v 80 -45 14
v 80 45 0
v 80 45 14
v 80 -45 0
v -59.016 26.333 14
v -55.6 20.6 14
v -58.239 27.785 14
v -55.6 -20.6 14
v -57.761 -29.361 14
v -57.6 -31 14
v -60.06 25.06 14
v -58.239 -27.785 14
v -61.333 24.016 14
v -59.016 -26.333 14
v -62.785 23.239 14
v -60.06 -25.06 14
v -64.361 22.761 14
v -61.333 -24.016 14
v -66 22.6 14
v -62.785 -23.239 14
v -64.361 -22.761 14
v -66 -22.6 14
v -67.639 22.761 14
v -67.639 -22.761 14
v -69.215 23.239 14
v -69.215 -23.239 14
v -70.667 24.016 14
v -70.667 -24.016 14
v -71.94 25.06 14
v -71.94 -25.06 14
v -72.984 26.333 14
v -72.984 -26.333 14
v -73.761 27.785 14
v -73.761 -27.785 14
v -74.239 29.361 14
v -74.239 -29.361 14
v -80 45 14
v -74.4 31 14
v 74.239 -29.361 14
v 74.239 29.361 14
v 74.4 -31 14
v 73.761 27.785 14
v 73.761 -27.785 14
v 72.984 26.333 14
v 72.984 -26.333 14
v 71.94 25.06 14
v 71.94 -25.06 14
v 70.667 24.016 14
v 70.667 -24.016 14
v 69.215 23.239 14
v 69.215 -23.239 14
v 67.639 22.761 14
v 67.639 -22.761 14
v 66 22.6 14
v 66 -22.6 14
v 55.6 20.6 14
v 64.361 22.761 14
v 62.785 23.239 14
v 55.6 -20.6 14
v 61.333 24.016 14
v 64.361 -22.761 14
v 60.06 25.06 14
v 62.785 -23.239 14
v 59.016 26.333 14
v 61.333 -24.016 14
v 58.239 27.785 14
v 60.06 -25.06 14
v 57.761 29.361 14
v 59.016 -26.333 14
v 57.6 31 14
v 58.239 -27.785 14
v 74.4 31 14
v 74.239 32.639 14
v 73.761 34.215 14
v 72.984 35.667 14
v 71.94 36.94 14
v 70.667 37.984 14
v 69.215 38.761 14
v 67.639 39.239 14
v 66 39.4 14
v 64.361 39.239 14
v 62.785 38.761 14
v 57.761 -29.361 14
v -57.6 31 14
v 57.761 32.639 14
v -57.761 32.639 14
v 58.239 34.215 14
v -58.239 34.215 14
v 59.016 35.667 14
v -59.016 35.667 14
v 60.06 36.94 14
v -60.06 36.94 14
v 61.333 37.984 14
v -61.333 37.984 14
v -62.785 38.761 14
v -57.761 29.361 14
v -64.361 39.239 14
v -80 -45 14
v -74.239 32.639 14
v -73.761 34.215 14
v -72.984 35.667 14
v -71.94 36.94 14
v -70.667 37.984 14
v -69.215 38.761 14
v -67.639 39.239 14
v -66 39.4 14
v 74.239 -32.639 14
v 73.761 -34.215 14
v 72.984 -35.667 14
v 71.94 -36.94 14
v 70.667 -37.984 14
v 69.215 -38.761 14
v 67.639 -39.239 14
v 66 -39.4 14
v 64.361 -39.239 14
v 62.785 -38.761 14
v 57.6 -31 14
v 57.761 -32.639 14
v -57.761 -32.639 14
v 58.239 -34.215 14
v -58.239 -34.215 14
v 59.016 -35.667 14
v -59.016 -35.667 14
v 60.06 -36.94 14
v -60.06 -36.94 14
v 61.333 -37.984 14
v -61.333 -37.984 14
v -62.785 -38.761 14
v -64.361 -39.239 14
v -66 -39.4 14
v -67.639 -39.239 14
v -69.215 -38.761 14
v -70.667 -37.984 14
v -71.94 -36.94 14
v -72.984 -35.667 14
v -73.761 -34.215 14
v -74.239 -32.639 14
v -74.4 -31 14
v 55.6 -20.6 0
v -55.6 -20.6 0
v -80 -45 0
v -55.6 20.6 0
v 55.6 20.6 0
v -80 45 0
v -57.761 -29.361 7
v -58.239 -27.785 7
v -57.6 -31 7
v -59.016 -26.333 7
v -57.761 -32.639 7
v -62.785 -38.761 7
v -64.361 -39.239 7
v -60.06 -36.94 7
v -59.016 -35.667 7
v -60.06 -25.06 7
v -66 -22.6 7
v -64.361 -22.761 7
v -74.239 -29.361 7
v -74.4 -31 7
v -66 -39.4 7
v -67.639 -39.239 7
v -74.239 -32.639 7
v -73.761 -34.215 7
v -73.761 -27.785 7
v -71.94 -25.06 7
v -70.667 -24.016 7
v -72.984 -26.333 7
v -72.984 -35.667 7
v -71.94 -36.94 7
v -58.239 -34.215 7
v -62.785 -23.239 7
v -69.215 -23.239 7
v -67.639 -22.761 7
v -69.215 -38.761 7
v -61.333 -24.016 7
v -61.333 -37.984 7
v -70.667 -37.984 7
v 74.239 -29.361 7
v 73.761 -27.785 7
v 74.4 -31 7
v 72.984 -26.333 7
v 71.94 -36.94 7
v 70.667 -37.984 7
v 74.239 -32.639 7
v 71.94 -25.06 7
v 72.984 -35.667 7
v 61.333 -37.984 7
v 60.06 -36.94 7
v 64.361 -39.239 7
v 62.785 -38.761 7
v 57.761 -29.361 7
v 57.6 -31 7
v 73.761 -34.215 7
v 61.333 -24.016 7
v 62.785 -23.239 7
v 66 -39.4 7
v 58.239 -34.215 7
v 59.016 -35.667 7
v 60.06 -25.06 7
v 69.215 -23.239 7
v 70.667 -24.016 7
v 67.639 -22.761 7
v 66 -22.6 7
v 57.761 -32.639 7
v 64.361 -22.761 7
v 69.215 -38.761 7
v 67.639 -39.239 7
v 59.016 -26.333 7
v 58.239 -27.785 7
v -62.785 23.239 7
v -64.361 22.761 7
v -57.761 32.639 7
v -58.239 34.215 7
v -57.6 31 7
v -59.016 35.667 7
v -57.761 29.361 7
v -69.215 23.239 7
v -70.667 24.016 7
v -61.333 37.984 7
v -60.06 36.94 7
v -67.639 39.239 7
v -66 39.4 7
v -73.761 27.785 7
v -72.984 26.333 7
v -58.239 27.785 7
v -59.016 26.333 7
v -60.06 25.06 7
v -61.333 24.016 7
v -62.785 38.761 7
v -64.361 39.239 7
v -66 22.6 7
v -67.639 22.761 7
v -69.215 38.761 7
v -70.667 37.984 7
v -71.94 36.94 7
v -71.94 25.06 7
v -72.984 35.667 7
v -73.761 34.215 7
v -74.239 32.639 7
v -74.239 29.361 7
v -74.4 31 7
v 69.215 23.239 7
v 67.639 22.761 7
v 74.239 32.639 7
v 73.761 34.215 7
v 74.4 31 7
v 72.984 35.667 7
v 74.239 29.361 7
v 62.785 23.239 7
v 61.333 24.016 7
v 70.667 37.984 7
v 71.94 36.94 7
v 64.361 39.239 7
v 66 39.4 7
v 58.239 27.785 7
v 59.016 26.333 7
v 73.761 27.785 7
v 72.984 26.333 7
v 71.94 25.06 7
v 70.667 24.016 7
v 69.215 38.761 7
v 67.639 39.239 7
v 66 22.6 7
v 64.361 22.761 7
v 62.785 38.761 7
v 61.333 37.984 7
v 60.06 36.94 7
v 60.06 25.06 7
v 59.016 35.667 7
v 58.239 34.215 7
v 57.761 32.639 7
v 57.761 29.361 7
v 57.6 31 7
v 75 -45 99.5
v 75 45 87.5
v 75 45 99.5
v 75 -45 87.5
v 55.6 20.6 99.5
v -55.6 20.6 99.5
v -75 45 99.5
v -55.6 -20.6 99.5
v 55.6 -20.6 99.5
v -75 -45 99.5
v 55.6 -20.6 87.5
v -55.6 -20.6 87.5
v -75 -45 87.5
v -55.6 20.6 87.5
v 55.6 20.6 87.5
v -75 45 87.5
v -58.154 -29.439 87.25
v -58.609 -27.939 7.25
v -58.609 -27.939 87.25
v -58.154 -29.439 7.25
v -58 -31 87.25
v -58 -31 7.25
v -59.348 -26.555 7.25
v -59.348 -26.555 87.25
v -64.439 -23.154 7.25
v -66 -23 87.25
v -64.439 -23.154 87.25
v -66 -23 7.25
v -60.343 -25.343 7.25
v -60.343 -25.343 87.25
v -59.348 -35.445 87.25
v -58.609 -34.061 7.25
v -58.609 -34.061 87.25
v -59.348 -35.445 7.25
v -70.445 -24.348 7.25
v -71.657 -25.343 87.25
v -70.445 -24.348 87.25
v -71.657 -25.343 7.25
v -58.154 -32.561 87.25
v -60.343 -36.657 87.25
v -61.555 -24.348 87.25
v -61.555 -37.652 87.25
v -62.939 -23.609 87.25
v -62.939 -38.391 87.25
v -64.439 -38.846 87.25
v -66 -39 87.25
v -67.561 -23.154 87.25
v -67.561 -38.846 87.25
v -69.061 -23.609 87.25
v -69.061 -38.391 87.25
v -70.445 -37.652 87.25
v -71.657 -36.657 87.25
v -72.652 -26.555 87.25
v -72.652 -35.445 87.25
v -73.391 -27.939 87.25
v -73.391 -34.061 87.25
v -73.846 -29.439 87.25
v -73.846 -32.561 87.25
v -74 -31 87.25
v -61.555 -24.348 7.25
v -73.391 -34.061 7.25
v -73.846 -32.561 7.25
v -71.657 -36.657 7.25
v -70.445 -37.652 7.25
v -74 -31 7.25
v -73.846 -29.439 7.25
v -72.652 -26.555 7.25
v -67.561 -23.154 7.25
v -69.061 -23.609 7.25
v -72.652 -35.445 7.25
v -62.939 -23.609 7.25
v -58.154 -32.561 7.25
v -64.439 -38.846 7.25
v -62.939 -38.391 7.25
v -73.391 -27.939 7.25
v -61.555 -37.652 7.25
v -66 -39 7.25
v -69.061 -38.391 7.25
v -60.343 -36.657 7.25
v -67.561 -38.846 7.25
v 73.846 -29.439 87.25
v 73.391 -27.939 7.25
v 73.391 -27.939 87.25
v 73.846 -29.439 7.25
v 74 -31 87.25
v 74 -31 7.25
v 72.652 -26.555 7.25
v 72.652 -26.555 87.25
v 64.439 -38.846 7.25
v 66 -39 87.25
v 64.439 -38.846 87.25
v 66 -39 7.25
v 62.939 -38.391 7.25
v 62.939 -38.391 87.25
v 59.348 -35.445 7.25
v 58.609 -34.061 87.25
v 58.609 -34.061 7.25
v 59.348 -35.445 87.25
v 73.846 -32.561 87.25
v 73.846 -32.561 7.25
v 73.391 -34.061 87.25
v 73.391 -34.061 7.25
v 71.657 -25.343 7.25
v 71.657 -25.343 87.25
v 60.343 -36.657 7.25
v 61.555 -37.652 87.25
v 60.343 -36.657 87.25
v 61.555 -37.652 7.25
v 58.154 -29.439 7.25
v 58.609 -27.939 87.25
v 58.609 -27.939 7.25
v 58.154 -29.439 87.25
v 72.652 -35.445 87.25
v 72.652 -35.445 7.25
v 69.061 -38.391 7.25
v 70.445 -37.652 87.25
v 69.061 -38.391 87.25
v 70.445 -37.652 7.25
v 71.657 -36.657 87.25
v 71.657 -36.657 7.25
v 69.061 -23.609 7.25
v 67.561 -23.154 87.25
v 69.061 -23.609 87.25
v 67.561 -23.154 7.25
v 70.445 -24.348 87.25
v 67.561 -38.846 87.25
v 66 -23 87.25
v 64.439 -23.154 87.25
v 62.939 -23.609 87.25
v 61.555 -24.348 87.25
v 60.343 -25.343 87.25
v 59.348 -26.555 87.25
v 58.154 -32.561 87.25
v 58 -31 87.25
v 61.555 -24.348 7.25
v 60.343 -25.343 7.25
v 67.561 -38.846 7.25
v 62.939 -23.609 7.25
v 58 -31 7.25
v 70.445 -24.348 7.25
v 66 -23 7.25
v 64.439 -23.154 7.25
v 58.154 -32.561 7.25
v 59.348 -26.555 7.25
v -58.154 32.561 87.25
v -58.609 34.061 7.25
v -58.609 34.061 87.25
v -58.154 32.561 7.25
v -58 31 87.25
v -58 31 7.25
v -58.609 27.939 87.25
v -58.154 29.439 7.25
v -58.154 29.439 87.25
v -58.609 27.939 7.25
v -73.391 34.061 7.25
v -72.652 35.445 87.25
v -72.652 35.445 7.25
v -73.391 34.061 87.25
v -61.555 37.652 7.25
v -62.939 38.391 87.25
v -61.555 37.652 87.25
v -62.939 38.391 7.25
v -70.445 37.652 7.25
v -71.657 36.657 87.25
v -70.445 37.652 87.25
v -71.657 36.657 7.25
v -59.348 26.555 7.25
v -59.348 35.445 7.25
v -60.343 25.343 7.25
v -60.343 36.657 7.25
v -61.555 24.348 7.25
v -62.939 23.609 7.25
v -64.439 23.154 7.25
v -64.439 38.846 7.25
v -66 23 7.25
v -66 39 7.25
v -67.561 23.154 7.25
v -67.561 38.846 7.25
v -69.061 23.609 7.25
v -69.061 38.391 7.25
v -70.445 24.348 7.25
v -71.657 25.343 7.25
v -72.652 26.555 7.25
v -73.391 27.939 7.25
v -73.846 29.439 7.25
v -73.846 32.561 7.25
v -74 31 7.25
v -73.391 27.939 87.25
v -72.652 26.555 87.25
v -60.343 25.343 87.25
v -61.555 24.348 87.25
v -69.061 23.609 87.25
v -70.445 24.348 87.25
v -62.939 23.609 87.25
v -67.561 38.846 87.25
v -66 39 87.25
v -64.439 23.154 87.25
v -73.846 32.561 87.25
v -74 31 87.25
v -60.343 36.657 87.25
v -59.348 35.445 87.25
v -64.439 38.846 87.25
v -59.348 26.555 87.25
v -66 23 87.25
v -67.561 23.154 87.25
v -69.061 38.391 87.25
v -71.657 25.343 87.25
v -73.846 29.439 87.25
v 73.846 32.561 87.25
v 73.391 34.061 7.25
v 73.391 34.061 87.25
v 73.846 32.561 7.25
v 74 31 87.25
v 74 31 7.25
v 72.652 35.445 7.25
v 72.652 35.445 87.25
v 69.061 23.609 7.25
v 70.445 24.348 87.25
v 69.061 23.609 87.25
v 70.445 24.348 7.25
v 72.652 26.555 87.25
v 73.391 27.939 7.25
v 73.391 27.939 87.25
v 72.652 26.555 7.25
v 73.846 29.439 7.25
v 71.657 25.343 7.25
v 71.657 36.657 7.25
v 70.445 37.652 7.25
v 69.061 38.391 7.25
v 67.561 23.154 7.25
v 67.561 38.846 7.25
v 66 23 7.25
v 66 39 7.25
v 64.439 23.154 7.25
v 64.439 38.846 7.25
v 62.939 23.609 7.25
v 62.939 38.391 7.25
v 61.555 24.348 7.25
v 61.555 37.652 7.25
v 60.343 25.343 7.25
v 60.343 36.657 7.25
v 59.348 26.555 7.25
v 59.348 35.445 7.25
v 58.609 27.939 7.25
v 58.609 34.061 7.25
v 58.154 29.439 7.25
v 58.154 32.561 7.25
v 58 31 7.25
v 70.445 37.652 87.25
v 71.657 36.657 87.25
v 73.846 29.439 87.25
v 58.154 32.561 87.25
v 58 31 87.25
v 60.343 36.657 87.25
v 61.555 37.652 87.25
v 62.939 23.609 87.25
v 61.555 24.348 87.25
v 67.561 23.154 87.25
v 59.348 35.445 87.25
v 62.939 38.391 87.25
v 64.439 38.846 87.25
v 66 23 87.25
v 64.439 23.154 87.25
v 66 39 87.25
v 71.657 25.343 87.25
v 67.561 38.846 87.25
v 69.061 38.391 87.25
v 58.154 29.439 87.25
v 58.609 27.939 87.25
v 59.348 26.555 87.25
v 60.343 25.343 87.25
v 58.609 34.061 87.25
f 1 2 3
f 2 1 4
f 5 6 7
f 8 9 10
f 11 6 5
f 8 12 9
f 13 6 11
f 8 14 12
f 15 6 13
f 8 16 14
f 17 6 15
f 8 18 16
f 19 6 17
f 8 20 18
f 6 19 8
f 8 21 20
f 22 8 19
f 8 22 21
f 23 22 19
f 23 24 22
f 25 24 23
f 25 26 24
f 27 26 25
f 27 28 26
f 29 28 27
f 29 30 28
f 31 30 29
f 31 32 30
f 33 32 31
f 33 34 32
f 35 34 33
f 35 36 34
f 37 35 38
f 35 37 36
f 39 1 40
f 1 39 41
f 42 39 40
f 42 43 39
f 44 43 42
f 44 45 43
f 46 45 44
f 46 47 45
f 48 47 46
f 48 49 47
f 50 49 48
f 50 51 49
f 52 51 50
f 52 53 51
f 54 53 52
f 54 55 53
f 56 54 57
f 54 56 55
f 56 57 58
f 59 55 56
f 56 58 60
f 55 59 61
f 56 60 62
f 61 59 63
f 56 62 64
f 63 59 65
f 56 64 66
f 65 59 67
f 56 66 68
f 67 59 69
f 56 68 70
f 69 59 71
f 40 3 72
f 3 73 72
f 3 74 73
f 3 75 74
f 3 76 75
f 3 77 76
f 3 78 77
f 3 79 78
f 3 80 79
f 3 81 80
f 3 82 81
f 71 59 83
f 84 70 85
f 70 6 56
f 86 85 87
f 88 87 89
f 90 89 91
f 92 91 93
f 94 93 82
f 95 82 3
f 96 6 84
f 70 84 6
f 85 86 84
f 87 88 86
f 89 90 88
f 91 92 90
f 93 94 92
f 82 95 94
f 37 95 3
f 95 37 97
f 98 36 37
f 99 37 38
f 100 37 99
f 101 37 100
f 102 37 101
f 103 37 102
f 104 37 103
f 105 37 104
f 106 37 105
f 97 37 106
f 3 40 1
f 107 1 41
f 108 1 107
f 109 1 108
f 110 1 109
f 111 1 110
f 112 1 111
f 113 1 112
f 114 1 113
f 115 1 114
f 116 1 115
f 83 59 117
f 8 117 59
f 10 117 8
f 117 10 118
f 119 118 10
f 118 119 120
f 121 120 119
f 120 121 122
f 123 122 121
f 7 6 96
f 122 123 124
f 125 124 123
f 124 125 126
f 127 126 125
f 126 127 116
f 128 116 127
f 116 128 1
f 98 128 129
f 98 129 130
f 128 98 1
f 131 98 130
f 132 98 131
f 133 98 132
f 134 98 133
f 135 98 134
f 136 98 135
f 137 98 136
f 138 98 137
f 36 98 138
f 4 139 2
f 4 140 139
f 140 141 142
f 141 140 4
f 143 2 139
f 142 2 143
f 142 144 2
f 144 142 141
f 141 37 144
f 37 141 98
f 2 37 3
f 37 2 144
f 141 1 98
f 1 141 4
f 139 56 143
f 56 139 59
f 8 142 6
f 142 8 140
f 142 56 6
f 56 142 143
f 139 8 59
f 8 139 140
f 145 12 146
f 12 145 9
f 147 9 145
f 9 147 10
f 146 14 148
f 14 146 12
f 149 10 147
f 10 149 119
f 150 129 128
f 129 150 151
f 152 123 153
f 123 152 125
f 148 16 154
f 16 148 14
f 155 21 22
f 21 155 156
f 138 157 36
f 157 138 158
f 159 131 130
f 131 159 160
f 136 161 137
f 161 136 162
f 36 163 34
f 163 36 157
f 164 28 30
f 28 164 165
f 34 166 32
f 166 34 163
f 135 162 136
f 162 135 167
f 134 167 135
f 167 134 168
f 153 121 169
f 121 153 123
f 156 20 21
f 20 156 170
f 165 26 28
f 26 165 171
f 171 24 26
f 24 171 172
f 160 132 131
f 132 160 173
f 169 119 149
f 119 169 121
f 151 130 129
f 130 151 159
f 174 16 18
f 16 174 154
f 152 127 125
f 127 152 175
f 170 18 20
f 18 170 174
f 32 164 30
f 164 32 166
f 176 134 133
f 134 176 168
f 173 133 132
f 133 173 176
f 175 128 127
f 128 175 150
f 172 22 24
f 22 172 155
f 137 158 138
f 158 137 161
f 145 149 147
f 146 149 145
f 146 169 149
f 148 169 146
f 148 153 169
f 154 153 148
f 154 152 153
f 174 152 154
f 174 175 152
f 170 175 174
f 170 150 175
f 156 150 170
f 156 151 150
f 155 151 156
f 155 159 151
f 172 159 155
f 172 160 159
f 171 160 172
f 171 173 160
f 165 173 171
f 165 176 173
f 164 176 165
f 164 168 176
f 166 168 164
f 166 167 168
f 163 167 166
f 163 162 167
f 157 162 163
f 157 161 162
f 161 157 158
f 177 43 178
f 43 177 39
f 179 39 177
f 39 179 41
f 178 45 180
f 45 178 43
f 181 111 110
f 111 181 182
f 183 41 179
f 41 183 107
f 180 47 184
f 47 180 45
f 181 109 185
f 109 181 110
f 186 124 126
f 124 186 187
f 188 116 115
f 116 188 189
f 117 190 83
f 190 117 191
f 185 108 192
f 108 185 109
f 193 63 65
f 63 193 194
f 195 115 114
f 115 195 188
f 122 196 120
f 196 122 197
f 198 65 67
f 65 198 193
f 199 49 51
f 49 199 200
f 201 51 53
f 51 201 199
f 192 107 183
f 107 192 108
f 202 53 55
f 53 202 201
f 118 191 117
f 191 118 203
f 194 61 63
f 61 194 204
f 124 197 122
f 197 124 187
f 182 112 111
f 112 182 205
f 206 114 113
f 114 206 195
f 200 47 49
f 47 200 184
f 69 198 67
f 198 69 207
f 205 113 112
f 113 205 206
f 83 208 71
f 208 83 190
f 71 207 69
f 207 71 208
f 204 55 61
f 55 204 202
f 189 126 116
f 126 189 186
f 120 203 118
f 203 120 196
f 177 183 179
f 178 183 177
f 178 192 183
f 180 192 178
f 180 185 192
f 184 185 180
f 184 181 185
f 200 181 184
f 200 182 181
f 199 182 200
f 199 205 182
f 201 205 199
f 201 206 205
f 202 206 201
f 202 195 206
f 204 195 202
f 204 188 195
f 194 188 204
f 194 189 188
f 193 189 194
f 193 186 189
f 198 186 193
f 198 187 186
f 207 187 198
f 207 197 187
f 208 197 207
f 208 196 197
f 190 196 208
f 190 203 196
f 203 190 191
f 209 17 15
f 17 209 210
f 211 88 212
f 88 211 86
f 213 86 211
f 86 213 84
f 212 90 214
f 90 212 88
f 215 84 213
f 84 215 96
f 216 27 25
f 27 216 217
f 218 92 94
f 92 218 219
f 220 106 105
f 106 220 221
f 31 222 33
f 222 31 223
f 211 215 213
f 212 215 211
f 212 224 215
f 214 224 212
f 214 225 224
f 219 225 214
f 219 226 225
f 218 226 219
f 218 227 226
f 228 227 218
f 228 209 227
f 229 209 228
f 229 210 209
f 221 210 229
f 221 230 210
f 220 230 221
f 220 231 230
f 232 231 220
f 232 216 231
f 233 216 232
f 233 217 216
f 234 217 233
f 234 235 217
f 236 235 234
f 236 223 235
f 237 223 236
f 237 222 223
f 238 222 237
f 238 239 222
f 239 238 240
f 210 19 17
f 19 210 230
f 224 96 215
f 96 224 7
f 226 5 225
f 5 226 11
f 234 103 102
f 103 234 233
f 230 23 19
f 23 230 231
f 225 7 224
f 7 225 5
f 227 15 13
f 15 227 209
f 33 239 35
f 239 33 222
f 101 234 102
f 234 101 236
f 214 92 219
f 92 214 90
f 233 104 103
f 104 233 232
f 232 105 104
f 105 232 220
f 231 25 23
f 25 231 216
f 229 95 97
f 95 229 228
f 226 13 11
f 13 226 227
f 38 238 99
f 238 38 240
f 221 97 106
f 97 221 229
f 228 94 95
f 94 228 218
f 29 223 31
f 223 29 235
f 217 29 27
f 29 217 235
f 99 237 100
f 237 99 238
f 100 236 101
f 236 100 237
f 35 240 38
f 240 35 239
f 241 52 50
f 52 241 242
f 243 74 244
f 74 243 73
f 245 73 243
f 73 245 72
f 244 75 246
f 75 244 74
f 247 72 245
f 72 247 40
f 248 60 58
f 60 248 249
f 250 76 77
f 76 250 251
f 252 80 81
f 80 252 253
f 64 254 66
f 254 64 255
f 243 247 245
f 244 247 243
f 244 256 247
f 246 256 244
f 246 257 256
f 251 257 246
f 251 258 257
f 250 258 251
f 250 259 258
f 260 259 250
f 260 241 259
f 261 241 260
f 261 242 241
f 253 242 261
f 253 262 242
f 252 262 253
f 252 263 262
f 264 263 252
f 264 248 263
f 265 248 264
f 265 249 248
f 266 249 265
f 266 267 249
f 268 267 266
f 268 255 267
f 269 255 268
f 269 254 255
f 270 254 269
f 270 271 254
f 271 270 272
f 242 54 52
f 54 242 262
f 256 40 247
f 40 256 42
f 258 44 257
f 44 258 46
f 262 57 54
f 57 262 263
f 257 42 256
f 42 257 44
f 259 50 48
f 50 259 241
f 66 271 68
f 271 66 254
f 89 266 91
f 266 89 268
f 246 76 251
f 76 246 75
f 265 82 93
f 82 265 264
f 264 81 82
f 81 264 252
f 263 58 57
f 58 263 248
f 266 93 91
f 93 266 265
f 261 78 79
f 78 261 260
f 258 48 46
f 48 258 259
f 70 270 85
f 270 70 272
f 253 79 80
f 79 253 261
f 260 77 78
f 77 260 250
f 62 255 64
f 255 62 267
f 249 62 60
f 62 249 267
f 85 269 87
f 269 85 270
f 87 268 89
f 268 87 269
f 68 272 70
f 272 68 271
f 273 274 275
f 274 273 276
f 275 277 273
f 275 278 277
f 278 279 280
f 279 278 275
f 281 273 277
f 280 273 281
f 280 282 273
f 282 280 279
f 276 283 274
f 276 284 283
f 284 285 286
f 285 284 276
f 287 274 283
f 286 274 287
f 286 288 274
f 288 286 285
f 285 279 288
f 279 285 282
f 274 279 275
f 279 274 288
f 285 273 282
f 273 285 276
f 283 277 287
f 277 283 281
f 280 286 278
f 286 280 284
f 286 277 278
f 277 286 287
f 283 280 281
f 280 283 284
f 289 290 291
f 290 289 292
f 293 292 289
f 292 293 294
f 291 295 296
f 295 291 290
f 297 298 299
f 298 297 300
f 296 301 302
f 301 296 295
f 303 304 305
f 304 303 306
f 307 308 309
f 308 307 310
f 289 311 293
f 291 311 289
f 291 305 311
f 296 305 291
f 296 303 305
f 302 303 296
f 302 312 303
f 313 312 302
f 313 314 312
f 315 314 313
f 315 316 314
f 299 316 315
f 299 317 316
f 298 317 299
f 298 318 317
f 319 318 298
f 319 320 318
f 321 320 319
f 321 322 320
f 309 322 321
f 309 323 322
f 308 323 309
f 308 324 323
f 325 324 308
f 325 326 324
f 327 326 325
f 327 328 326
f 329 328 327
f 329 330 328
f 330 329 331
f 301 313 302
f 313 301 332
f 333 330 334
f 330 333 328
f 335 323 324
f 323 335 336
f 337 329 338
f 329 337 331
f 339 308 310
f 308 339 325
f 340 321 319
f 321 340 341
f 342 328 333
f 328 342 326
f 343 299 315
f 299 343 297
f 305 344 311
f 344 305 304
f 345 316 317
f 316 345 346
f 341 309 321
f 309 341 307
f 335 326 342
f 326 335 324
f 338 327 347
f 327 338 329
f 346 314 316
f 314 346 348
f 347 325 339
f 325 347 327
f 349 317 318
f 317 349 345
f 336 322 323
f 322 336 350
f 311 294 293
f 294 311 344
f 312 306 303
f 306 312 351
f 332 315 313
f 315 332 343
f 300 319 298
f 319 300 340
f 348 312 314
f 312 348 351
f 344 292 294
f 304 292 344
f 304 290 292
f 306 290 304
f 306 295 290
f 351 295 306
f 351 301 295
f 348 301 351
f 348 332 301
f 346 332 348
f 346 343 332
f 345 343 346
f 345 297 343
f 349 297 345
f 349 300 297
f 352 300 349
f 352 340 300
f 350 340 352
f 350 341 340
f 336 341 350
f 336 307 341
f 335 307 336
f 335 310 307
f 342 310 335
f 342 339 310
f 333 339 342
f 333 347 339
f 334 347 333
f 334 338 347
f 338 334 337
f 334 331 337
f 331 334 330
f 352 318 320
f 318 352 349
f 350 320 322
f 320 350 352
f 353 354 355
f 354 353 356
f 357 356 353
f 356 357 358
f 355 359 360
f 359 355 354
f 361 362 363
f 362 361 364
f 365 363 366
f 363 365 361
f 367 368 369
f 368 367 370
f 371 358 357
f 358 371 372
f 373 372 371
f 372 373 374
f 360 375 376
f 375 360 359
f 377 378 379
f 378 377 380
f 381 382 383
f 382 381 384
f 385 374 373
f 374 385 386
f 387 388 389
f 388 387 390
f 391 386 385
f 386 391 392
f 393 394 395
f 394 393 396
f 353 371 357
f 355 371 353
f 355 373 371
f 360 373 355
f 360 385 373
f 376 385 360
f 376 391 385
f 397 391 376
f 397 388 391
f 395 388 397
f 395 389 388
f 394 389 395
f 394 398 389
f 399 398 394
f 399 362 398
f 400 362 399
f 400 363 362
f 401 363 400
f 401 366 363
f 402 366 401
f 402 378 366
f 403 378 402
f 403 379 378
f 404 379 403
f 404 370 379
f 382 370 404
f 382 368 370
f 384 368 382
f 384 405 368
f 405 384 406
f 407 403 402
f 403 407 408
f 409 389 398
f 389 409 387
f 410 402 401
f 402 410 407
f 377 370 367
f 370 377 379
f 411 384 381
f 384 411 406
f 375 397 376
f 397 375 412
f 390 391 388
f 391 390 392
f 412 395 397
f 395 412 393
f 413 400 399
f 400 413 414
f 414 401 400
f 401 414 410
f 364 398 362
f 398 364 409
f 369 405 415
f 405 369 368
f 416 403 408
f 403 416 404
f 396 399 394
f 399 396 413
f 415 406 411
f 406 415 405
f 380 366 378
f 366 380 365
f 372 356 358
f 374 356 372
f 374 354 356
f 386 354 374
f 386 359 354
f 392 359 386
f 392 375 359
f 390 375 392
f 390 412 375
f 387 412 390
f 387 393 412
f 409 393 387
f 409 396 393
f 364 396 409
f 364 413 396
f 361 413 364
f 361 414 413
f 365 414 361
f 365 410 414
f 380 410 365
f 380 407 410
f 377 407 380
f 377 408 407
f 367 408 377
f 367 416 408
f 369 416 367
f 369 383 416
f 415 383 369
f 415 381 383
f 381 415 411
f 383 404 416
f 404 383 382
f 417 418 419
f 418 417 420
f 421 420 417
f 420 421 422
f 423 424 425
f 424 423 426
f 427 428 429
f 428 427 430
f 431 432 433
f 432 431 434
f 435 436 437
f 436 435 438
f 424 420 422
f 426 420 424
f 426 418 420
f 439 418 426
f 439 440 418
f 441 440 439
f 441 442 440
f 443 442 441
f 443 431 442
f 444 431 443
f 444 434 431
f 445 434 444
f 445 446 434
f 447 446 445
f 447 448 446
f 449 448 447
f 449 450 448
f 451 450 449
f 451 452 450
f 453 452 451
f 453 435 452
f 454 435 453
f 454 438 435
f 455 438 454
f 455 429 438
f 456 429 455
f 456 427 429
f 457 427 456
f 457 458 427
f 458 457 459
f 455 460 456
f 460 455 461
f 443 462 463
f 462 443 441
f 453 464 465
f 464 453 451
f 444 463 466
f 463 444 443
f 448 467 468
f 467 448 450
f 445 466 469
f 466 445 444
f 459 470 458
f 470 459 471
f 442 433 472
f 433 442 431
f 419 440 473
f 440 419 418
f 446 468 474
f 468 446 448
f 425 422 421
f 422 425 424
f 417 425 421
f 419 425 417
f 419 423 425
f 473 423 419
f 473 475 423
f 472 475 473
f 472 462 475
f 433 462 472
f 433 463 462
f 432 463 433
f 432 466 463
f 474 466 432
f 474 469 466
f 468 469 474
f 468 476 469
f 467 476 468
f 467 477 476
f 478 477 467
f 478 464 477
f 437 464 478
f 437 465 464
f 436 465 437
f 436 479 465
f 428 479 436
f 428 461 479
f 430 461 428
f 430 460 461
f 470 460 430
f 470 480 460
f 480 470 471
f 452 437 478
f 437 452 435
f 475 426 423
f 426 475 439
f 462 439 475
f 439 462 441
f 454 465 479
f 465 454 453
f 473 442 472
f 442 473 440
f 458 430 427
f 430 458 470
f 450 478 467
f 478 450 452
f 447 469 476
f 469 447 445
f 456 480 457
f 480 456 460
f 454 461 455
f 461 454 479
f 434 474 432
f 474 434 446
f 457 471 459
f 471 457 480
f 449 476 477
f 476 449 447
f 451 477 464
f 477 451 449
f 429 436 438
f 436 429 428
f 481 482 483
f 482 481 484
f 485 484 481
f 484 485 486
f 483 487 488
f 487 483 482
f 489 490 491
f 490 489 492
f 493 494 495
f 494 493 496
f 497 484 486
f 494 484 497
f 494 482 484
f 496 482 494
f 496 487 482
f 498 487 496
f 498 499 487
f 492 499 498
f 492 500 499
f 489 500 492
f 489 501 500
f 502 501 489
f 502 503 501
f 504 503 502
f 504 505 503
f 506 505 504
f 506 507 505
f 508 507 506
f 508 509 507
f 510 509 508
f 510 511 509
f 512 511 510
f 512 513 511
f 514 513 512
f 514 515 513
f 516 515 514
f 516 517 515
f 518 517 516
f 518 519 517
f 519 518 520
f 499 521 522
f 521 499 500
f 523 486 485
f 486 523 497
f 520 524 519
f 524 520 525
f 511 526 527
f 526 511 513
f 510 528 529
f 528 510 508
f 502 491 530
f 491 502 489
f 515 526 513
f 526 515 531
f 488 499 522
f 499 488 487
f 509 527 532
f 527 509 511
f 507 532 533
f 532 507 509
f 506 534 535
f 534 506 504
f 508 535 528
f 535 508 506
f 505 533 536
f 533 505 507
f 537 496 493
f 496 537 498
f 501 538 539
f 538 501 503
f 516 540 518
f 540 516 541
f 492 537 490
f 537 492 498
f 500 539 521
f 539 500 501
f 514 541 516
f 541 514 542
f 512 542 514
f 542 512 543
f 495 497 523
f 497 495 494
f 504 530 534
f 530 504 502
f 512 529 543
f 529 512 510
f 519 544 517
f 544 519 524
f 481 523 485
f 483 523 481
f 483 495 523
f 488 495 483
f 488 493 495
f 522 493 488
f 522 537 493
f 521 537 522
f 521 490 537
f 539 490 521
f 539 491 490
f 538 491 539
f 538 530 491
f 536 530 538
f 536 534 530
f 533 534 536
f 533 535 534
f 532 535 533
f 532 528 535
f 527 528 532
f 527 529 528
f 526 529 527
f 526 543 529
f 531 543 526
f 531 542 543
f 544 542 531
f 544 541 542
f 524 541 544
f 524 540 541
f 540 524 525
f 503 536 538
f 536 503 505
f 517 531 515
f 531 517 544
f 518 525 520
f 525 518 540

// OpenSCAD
$fn = 32;

// ------------------------------------------------------------------------
// Frame cube: base 160 x 90 mm, posts 80 mm tall
// Every part is its own module, assembly() places every instance.
// ------------------------------------------------------------------------

// --- part 1 ---
module base_frame() {
  difference() {
    translate([-80, -45, 0]) cube([160, 90, 14]);
    translate([-55.6, -20.6, -1]) cube([111.2, 41.2, 16]);
    translate([-66, -31, 7]) cylinder(h = 8, d = 16.8);
    translate([66, -31, 7]) cylinder(h = 8, d = 16.8);
    translate([-66, 31, 7]) cylinder(h = 8, d = 16.8);
    translate([66, 31, 7]) cylinder(h = 8, d = 16.8);
  }
}

// --- part 2 ---
module corner_post() {
  cylinder(h = 80, d = 16);
}

// --- part 3 ---
module top_frame() {
  difference() {
    translate([-75, -45, 0]) cube([150, 90, 12]);
    translate([-55.6, -20.6, -1]) cube([111.2, 41.2, 14]);
  }
}

// --- assembly ---
module assembly() {
  color([0.80, 0.24, 0.20]) translate([0, 0, 0]) rotate([0, 0, 0]) base_frame();
  color([0.20, 0.45, 0.75]) translate([-66, -31, 7.25]) rotate([0, 0, 0]) corner_post();
  color([0.25, 0.62, 0.32]) translate([66, -31, 7.25]) rotate([0, 0, 0]) corner_post();
  color([0.92, 0.70, 0.18]) translate([-66, 31, 7.25]) rotate([0, 0, 0]) corner_post();
  color([0.58, 0.35, 0.70]) translate([66, 31, 7.25]) rotate([0, 0, 0]) corner_post();
  color([0.16, 0.66, 0.66]) translate([0, 0, 87.5]) rotate([0, 0, 0]) top_frame();
}

assembly();
